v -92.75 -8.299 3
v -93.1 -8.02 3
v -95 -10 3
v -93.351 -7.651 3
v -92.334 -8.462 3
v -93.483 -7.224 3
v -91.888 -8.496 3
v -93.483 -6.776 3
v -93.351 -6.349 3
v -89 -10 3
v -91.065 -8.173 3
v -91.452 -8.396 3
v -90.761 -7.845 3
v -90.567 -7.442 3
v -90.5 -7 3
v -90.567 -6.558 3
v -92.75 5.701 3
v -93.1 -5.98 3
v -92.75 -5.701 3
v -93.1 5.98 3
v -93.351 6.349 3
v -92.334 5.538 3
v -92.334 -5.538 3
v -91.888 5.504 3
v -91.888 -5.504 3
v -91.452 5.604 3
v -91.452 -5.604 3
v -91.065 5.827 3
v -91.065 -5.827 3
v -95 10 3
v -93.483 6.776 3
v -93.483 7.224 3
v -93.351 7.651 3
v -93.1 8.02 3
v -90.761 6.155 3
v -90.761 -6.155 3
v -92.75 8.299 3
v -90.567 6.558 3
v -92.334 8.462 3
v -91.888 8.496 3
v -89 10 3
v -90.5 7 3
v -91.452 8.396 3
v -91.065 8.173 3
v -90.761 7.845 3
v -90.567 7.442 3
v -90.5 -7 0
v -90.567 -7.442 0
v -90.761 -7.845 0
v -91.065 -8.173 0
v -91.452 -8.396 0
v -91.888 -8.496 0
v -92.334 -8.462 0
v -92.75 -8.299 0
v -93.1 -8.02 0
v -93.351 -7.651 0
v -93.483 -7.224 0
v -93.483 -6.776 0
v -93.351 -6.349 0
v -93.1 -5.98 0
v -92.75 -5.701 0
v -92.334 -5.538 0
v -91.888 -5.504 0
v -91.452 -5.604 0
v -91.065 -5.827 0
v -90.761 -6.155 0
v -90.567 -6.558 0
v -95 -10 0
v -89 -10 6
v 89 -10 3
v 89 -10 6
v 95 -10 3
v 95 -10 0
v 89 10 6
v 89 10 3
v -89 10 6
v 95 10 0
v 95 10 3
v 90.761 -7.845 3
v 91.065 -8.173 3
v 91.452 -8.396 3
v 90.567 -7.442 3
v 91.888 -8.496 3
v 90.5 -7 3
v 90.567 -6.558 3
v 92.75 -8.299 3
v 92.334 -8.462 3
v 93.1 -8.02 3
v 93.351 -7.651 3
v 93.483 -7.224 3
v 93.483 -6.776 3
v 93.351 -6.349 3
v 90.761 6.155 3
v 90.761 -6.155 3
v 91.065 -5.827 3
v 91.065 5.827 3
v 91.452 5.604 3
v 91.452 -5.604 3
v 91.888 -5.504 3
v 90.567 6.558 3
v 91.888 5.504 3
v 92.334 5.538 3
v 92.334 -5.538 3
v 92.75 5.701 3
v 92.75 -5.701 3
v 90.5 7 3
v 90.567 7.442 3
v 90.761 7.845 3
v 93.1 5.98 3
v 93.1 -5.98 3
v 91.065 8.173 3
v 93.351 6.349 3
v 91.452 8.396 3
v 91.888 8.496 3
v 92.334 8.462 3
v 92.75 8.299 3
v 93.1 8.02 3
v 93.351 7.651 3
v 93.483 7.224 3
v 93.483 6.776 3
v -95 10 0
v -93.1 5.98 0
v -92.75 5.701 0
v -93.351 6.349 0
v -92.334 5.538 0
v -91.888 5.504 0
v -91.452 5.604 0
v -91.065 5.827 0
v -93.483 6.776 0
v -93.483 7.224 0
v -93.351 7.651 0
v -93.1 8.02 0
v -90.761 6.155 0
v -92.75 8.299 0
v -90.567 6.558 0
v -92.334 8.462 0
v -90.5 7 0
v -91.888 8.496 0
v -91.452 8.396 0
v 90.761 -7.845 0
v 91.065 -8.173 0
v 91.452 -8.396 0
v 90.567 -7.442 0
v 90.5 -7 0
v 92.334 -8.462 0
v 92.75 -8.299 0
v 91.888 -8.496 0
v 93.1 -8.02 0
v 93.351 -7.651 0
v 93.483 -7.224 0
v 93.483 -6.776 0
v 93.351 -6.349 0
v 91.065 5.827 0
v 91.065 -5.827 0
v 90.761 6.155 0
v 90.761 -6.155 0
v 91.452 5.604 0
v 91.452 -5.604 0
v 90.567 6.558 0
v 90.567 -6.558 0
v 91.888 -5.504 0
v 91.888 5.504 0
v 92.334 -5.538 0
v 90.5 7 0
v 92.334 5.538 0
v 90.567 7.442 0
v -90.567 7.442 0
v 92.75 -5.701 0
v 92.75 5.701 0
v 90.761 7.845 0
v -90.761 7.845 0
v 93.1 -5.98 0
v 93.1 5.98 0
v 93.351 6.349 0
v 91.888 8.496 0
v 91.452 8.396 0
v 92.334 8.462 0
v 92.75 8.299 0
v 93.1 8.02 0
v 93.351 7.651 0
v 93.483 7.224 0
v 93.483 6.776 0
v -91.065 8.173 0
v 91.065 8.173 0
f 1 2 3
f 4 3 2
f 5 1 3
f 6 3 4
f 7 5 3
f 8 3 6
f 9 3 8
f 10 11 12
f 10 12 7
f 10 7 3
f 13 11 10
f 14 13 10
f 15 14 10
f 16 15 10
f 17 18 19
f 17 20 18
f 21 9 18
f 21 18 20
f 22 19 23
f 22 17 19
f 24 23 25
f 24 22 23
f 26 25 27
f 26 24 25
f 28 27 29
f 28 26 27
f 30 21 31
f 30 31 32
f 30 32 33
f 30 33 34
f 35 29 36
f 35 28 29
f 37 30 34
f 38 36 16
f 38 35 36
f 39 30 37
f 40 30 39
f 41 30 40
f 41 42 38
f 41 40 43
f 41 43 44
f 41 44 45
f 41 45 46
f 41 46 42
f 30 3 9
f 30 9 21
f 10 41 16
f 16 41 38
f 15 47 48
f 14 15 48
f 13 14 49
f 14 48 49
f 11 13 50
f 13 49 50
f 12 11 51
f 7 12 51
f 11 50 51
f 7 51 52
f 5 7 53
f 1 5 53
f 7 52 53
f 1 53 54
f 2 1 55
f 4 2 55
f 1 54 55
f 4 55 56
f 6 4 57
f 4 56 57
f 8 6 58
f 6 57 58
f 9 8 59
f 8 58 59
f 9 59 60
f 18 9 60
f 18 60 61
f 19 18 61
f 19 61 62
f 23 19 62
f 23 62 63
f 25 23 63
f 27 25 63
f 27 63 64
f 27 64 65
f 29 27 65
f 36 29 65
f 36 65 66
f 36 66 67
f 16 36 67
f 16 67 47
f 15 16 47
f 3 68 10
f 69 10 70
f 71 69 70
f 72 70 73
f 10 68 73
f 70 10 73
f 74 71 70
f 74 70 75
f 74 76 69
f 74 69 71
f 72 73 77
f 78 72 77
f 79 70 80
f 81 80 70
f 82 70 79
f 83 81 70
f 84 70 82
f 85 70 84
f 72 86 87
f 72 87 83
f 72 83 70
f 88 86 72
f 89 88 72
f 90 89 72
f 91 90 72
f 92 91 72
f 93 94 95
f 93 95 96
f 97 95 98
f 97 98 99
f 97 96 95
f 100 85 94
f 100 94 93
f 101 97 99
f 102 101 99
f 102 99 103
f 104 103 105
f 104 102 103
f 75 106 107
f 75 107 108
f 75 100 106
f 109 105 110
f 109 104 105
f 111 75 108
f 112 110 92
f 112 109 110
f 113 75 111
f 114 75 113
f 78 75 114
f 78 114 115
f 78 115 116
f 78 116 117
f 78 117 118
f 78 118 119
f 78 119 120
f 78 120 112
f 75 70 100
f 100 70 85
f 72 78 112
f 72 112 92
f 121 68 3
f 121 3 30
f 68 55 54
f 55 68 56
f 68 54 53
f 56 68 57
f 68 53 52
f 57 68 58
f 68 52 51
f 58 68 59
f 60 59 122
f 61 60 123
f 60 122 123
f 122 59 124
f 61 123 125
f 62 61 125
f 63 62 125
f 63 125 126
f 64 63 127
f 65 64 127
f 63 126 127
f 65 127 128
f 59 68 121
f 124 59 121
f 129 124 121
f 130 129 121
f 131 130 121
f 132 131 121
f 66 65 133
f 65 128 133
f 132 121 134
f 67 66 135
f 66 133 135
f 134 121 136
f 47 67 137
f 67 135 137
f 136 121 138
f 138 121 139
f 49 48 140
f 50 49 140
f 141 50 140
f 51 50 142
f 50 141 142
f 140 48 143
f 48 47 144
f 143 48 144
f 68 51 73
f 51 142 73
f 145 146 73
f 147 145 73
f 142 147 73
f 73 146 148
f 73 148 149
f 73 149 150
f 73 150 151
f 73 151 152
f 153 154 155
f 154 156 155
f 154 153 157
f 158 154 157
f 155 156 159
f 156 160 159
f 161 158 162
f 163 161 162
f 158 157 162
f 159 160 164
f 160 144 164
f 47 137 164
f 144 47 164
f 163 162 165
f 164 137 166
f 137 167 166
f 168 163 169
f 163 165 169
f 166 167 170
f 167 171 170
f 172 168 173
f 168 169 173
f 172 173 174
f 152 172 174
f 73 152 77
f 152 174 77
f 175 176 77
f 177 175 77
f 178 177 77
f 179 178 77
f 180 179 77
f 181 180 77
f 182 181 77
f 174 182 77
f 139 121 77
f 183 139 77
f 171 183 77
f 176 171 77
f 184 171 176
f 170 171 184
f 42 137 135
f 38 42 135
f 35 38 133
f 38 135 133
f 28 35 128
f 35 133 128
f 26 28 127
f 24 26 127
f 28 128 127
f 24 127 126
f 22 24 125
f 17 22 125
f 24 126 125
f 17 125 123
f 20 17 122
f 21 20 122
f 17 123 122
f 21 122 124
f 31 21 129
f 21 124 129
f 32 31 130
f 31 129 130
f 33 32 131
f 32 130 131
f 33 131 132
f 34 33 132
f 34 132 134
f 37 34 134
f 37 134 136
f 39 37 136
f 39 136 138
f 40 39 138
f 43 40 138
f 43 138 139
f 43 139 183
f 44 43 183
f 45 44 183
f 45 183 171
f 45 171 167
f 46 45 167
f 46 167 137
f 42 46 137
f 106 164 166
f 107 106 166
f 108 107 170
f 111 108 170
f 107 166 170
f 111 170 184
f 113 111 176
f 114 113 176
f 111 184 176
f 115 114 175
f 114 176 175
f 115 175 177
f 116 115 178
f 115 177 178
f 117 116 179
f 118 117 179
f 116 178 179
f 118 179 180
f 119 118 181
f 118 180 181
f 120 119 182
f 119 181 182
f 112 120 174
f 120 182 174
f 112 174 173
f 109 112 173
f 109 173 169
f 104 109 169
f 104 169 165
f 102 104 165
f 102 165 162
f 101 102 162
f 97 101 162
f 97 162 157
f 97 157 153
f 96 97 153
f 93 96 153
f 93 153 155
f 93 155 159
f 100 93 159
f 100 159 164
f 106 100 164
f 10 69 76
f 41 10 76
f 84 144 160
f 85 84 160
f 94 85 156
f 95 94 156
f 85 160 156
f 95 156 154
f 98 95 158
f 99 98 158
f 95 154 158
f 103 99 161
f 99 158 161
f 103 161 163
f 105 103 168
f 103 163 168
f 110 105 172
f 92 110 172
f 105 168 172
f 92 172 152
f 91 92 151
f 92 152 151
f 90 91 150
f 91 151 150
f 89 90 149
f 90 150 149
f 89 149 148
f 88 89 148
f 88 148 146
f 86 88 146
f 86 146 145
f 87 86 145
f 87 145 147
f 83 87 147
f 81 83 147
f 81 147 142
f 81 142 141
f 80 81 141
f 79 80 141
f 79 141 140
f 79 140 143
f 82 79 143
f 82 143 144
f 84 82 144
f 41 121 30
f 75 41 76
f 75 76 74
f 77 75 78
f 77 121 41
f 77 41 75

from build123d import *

# Parameters (mm, degrees)
ESQUISSE1_W             = 190
ESQUISSE1_H             = 20
BOSS_EXTRU_1_DEPTH      = 6
ESQUISSE2_W             = 6
ESQUISSE2_H             = 20
ENL_V_MAT_EXTRU_1_DEPTH = 3
ESQUISSE3_R             = 1.5
ENL_V_MAT_EXTRU_2_DEPTH = 6


with BuildPart() as part:
    # Esquisse1 → Boss.-Extru.1 (new body)
    with BuildSketch(Plane.XY):
        Rectangle(ESQUISSE1_W, ESQUISSE1_H)
    extrude(amount=BOSS_EXTRU_1_DEPTH)

    # Esquisse2 → Enlèv. mat.-Extru.1 (cut)
    with BuildSketch(Plane.XY.offset(6)):
        with Locations((-92, 0)):
            Rectangle(ESQUISSE2_W, ESQUISSE2_H)
        with Locations((92, 0)):
            Rectangle(ESQUISSE2_W, ESQUISSE2_H)
    extrude(amount=-ENL_V_MAT_EXTRU_1_DEPTH, mode=Mode.SUBTRACT)

    # Esquisse3 → Enlèv. mat.-Extru.2 (cut)
    with BuildSketch(Plane(origin=(0, 0, 0), x_dir=(-1, 0, 0), z_dir=(0, 0, -1))):
        with Locations((-92, -7)):
            Circle(ESQUISSE3_R)
        with Locations((-92, 7)):
            Circle(ESQUISSE3_R)
        with Locations(Location((92, 7, 0), (0, 0, 180))):
            Circle(ESQUISSE3_R)
        with Locations(Location((92, -7, 0), (0, 0, 180))):
            Circle(ESQUISSE3_R)
    extrude(amount=-ENL_V_MAT_EXTRU_2_DEPTH, mode=Mode.SUBTRACT)


solid = part.part
